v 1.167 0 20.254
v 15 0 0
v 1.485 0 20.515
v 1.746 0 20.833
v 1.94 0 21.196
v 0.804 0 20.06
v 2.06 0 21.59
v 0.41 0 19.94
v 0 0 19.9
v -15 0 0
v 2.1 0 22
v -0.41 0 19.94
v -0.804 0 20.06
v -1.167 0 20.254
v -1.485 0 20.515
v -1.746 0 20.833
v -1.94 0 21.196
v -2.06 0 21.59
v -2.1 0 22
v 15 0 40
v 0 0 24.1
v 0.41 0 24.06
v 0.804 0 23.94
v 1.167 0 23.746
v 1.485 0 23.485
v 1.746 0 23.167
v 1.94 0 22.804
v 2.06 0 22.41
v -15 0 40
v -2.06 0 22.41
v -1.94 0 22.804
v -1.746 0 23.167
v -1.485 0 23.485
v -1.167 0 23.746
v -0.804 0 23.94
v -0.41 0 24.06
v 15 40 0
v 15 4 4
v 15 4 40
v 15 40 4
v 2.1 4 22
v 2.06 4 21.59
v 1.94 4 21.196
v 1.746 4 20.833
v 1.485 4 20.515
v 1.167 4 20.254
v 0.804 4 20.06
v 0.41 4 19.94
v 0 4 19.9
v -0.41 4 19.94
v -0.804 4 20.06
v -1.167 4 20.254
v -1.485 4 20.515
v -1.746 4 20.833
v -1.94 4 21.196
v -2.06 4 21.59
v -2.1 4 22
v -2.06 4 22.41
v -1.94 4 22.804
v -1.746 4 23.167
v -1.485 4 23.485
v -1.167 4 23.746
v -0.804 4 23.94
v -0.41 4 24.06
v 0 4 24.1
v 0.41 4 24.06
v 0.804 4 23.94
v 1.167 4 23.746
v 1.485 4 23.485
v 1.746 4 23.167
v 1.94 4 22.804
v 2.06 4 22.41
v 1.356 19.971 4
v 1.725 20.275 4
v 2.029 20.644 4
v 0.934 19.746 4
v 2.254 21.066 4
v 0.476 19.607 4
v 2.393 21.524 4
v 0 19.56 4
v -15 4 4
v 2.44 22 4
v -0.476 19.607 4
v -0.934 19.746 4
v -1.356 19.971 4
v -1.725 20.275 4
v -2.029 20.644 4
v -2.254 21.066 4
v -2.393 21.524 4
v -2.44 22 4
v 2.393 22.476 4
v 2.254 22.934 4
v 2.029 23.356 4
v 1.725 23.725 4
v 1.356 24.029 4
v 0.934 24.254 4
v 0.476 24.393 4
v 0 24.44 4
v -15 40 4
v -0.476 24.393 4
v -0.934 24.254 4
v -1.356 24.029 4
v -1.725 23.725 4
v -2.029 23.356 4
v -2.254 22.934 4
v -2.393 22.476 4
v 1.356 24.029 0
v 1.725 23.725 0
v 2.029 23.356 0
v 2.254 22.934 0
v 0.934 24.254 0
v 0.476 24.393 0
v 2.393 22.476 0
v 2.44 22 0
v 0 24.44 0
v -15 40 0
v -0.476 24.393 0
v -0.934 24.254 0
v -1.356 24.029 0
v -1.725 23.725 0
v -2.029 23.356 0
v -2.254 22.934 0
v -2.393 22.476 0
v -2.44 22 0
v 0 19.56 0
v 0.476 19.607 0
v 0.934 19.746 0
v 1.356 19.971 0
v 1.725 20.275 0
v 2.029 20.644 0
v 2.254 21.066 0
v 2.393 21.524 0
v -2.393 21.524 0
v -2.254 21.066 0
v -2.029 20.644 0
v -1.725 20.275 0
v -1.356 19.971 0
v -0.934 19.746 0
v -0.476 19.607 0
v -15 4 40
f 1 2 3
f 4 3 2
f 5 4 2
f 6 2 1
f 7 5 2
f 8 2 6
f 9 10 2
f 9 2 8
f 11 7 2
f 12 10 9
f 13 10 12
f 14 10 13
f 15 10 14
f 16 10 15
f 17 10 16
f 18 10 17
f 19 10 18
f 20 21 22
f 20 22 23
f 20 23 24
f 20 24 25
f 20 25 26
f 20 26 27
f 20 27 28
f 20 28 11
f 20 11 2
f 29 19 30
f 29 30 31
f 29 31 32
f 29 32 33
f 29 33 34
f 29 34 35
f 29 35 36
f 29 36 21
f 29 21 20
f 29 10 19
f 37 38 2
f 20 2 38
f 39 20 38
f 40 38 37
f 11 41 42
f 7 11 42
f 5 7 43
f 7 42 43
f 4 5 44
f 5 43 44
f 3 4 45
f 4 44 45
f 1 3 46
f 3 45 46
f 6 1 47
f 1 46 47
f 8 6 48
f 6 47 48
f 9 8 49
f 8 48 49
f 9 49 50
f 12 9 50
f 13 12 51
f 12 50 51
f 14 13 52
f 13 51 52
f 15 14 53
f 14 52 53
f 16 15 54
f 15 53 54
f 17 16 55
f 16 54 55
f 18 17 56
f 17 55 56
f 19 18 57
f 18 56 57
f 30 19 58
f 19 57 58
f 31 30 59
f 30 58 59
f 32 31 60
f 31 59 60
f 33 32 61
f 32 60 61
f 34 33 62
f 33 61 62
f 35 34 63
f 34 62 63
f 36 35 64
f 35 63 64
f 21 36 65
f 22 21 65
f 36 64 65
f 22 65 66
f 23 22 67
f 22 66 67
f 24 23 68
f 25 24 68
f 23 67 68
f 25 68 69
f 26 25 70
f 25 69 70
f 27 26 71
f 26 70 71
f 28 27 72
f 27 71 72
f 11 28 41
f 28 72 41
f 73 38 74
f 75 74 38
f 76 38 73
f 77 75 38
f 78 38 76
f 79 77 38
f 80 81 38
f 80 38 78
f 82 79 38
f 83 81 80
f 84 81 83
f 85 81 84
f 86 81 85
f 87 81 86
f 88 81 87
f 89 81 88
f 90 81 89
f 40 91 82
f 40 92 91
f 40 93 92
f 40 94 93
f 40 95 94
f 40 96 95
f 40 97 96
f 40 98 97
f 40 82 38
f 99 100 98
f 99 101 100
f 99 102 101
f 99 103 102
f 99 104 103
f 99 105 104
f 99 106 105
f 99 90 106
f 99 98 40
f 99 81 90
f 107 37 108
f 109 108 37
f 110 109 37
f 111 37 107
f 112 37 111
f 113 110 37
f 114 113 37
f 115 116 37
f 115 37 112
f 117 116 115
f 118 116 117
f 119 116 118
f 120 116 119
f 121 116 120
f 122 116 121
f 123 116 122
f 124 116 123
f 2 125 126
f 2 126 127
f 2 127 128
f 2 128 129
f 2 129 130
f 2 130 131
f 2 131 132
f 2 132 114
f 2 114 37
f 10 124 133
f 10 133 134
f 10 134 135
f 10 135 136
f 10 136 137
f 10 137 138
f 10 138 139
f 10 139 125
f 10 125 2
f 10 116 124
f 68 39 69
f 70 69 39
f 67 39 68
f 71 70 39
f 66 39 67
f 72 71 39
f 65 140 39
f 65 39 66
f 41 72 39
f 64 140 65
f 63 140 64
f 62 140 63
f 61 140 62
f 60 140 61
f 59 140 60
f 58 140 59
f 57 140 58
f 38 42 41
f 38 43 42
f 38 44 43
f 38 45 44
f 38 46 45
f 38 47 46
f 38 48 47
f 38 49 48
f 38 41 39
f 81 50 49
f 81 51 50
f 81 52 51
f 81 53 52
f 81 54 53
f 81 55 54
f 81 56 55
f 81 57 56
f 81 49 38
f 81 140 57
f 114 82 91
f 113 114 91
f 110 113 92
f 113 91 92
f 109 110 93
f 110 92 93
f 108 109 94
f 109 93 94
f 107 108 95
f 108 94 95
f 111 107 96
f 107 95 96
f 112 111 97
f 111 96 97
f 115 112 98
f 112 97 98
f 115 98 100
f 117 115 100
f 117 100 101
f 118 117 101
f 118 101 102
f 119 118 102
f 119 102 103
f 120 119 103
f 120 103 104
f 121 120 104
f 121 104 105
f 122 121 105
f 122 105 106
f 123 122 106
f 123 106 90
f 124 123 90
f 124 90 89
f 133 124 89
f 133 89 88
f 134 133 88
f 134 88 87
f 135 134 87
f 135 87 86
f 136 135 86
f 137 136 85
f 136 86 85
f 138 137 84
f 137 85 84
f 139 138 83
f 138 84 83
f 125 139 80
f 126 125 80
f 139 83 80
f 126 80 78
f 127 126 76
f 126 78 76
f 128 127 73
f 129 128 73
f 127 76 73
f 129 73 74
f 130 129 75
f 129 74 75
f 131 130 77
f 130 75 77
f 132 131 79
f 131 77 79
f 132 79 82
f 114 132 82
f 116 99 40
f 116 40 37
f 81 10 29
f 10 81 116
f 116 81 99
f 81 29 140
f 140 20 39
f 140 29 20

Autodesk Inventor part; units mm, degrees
ref_plane "YZ Plane" through (0, 0, 0) normal (1, 0, 0) x (0, 1, 0)
ref_plane "XZ Plane" through (0, 0, 0) normal (0, 1, 0) x (-1, 0, 0)
ref_plane "XY Plane" through (0, 0, 0) normal (0, 0, 1) x (1, 0, 0)
sketch "Sketch1" plane through (0, 0, 0) normal (1, 0, 0) x (0, 1, 0)
  line L0 (0, 0) -> (0, 40)
  line L1 (0, 40) -> (4, 40)
  line L2 (4, 40) -> (4, 4)
  line L3 (4, 4) -> (40, 4)
  line L4 (40, 4) -> (40, 0)
  line L5 (40, 0) -> (0, 0)
  dimension "d0" = 40
  dimension "d1" = 4
extrude "Extrusion1" add sketch "Sketch1" along normal mid plane 30
sketch "Sketch4" plane through (-15, 4, 4) normal (0, 0, 1) x (1, 0, 0)
  circle A0 centre (15, 18) radius 2.44
  line L0 (30, 36) -> (30, 0) projected
  line L1 (0, 36) -> (30, 36) projected
  point P0 (15, -4)
  point P1 (30, 18)
  point P2 (15, 36)
extrude "Extrusion3" cut sketch "Sketch4" against normal blind 10
sketch "Sketch5" plane through (-15, 4, 40) normal (0, 1, 0) x (1, 0, 0)
  line L0 (0, 0) -> (30, 0) projected
  line L1 (30, 36) -> (30, 0) projected
  line L2 (0, 36) -> (30, 36) projected
  line L3 (0, 0) -> (0, 36) projected
  circle A0 centre (15, 18) radius 2.1
  point P0 (15, 40)
  point P1 (30, 18)
  point P2 (15, 0)
  dimension "d9" = 4.2
extrude "Extrusion4" cut sketch "Sketch5" against normal through all contours A0
properties part number "30x30_angle" material "Stainless Steel"
